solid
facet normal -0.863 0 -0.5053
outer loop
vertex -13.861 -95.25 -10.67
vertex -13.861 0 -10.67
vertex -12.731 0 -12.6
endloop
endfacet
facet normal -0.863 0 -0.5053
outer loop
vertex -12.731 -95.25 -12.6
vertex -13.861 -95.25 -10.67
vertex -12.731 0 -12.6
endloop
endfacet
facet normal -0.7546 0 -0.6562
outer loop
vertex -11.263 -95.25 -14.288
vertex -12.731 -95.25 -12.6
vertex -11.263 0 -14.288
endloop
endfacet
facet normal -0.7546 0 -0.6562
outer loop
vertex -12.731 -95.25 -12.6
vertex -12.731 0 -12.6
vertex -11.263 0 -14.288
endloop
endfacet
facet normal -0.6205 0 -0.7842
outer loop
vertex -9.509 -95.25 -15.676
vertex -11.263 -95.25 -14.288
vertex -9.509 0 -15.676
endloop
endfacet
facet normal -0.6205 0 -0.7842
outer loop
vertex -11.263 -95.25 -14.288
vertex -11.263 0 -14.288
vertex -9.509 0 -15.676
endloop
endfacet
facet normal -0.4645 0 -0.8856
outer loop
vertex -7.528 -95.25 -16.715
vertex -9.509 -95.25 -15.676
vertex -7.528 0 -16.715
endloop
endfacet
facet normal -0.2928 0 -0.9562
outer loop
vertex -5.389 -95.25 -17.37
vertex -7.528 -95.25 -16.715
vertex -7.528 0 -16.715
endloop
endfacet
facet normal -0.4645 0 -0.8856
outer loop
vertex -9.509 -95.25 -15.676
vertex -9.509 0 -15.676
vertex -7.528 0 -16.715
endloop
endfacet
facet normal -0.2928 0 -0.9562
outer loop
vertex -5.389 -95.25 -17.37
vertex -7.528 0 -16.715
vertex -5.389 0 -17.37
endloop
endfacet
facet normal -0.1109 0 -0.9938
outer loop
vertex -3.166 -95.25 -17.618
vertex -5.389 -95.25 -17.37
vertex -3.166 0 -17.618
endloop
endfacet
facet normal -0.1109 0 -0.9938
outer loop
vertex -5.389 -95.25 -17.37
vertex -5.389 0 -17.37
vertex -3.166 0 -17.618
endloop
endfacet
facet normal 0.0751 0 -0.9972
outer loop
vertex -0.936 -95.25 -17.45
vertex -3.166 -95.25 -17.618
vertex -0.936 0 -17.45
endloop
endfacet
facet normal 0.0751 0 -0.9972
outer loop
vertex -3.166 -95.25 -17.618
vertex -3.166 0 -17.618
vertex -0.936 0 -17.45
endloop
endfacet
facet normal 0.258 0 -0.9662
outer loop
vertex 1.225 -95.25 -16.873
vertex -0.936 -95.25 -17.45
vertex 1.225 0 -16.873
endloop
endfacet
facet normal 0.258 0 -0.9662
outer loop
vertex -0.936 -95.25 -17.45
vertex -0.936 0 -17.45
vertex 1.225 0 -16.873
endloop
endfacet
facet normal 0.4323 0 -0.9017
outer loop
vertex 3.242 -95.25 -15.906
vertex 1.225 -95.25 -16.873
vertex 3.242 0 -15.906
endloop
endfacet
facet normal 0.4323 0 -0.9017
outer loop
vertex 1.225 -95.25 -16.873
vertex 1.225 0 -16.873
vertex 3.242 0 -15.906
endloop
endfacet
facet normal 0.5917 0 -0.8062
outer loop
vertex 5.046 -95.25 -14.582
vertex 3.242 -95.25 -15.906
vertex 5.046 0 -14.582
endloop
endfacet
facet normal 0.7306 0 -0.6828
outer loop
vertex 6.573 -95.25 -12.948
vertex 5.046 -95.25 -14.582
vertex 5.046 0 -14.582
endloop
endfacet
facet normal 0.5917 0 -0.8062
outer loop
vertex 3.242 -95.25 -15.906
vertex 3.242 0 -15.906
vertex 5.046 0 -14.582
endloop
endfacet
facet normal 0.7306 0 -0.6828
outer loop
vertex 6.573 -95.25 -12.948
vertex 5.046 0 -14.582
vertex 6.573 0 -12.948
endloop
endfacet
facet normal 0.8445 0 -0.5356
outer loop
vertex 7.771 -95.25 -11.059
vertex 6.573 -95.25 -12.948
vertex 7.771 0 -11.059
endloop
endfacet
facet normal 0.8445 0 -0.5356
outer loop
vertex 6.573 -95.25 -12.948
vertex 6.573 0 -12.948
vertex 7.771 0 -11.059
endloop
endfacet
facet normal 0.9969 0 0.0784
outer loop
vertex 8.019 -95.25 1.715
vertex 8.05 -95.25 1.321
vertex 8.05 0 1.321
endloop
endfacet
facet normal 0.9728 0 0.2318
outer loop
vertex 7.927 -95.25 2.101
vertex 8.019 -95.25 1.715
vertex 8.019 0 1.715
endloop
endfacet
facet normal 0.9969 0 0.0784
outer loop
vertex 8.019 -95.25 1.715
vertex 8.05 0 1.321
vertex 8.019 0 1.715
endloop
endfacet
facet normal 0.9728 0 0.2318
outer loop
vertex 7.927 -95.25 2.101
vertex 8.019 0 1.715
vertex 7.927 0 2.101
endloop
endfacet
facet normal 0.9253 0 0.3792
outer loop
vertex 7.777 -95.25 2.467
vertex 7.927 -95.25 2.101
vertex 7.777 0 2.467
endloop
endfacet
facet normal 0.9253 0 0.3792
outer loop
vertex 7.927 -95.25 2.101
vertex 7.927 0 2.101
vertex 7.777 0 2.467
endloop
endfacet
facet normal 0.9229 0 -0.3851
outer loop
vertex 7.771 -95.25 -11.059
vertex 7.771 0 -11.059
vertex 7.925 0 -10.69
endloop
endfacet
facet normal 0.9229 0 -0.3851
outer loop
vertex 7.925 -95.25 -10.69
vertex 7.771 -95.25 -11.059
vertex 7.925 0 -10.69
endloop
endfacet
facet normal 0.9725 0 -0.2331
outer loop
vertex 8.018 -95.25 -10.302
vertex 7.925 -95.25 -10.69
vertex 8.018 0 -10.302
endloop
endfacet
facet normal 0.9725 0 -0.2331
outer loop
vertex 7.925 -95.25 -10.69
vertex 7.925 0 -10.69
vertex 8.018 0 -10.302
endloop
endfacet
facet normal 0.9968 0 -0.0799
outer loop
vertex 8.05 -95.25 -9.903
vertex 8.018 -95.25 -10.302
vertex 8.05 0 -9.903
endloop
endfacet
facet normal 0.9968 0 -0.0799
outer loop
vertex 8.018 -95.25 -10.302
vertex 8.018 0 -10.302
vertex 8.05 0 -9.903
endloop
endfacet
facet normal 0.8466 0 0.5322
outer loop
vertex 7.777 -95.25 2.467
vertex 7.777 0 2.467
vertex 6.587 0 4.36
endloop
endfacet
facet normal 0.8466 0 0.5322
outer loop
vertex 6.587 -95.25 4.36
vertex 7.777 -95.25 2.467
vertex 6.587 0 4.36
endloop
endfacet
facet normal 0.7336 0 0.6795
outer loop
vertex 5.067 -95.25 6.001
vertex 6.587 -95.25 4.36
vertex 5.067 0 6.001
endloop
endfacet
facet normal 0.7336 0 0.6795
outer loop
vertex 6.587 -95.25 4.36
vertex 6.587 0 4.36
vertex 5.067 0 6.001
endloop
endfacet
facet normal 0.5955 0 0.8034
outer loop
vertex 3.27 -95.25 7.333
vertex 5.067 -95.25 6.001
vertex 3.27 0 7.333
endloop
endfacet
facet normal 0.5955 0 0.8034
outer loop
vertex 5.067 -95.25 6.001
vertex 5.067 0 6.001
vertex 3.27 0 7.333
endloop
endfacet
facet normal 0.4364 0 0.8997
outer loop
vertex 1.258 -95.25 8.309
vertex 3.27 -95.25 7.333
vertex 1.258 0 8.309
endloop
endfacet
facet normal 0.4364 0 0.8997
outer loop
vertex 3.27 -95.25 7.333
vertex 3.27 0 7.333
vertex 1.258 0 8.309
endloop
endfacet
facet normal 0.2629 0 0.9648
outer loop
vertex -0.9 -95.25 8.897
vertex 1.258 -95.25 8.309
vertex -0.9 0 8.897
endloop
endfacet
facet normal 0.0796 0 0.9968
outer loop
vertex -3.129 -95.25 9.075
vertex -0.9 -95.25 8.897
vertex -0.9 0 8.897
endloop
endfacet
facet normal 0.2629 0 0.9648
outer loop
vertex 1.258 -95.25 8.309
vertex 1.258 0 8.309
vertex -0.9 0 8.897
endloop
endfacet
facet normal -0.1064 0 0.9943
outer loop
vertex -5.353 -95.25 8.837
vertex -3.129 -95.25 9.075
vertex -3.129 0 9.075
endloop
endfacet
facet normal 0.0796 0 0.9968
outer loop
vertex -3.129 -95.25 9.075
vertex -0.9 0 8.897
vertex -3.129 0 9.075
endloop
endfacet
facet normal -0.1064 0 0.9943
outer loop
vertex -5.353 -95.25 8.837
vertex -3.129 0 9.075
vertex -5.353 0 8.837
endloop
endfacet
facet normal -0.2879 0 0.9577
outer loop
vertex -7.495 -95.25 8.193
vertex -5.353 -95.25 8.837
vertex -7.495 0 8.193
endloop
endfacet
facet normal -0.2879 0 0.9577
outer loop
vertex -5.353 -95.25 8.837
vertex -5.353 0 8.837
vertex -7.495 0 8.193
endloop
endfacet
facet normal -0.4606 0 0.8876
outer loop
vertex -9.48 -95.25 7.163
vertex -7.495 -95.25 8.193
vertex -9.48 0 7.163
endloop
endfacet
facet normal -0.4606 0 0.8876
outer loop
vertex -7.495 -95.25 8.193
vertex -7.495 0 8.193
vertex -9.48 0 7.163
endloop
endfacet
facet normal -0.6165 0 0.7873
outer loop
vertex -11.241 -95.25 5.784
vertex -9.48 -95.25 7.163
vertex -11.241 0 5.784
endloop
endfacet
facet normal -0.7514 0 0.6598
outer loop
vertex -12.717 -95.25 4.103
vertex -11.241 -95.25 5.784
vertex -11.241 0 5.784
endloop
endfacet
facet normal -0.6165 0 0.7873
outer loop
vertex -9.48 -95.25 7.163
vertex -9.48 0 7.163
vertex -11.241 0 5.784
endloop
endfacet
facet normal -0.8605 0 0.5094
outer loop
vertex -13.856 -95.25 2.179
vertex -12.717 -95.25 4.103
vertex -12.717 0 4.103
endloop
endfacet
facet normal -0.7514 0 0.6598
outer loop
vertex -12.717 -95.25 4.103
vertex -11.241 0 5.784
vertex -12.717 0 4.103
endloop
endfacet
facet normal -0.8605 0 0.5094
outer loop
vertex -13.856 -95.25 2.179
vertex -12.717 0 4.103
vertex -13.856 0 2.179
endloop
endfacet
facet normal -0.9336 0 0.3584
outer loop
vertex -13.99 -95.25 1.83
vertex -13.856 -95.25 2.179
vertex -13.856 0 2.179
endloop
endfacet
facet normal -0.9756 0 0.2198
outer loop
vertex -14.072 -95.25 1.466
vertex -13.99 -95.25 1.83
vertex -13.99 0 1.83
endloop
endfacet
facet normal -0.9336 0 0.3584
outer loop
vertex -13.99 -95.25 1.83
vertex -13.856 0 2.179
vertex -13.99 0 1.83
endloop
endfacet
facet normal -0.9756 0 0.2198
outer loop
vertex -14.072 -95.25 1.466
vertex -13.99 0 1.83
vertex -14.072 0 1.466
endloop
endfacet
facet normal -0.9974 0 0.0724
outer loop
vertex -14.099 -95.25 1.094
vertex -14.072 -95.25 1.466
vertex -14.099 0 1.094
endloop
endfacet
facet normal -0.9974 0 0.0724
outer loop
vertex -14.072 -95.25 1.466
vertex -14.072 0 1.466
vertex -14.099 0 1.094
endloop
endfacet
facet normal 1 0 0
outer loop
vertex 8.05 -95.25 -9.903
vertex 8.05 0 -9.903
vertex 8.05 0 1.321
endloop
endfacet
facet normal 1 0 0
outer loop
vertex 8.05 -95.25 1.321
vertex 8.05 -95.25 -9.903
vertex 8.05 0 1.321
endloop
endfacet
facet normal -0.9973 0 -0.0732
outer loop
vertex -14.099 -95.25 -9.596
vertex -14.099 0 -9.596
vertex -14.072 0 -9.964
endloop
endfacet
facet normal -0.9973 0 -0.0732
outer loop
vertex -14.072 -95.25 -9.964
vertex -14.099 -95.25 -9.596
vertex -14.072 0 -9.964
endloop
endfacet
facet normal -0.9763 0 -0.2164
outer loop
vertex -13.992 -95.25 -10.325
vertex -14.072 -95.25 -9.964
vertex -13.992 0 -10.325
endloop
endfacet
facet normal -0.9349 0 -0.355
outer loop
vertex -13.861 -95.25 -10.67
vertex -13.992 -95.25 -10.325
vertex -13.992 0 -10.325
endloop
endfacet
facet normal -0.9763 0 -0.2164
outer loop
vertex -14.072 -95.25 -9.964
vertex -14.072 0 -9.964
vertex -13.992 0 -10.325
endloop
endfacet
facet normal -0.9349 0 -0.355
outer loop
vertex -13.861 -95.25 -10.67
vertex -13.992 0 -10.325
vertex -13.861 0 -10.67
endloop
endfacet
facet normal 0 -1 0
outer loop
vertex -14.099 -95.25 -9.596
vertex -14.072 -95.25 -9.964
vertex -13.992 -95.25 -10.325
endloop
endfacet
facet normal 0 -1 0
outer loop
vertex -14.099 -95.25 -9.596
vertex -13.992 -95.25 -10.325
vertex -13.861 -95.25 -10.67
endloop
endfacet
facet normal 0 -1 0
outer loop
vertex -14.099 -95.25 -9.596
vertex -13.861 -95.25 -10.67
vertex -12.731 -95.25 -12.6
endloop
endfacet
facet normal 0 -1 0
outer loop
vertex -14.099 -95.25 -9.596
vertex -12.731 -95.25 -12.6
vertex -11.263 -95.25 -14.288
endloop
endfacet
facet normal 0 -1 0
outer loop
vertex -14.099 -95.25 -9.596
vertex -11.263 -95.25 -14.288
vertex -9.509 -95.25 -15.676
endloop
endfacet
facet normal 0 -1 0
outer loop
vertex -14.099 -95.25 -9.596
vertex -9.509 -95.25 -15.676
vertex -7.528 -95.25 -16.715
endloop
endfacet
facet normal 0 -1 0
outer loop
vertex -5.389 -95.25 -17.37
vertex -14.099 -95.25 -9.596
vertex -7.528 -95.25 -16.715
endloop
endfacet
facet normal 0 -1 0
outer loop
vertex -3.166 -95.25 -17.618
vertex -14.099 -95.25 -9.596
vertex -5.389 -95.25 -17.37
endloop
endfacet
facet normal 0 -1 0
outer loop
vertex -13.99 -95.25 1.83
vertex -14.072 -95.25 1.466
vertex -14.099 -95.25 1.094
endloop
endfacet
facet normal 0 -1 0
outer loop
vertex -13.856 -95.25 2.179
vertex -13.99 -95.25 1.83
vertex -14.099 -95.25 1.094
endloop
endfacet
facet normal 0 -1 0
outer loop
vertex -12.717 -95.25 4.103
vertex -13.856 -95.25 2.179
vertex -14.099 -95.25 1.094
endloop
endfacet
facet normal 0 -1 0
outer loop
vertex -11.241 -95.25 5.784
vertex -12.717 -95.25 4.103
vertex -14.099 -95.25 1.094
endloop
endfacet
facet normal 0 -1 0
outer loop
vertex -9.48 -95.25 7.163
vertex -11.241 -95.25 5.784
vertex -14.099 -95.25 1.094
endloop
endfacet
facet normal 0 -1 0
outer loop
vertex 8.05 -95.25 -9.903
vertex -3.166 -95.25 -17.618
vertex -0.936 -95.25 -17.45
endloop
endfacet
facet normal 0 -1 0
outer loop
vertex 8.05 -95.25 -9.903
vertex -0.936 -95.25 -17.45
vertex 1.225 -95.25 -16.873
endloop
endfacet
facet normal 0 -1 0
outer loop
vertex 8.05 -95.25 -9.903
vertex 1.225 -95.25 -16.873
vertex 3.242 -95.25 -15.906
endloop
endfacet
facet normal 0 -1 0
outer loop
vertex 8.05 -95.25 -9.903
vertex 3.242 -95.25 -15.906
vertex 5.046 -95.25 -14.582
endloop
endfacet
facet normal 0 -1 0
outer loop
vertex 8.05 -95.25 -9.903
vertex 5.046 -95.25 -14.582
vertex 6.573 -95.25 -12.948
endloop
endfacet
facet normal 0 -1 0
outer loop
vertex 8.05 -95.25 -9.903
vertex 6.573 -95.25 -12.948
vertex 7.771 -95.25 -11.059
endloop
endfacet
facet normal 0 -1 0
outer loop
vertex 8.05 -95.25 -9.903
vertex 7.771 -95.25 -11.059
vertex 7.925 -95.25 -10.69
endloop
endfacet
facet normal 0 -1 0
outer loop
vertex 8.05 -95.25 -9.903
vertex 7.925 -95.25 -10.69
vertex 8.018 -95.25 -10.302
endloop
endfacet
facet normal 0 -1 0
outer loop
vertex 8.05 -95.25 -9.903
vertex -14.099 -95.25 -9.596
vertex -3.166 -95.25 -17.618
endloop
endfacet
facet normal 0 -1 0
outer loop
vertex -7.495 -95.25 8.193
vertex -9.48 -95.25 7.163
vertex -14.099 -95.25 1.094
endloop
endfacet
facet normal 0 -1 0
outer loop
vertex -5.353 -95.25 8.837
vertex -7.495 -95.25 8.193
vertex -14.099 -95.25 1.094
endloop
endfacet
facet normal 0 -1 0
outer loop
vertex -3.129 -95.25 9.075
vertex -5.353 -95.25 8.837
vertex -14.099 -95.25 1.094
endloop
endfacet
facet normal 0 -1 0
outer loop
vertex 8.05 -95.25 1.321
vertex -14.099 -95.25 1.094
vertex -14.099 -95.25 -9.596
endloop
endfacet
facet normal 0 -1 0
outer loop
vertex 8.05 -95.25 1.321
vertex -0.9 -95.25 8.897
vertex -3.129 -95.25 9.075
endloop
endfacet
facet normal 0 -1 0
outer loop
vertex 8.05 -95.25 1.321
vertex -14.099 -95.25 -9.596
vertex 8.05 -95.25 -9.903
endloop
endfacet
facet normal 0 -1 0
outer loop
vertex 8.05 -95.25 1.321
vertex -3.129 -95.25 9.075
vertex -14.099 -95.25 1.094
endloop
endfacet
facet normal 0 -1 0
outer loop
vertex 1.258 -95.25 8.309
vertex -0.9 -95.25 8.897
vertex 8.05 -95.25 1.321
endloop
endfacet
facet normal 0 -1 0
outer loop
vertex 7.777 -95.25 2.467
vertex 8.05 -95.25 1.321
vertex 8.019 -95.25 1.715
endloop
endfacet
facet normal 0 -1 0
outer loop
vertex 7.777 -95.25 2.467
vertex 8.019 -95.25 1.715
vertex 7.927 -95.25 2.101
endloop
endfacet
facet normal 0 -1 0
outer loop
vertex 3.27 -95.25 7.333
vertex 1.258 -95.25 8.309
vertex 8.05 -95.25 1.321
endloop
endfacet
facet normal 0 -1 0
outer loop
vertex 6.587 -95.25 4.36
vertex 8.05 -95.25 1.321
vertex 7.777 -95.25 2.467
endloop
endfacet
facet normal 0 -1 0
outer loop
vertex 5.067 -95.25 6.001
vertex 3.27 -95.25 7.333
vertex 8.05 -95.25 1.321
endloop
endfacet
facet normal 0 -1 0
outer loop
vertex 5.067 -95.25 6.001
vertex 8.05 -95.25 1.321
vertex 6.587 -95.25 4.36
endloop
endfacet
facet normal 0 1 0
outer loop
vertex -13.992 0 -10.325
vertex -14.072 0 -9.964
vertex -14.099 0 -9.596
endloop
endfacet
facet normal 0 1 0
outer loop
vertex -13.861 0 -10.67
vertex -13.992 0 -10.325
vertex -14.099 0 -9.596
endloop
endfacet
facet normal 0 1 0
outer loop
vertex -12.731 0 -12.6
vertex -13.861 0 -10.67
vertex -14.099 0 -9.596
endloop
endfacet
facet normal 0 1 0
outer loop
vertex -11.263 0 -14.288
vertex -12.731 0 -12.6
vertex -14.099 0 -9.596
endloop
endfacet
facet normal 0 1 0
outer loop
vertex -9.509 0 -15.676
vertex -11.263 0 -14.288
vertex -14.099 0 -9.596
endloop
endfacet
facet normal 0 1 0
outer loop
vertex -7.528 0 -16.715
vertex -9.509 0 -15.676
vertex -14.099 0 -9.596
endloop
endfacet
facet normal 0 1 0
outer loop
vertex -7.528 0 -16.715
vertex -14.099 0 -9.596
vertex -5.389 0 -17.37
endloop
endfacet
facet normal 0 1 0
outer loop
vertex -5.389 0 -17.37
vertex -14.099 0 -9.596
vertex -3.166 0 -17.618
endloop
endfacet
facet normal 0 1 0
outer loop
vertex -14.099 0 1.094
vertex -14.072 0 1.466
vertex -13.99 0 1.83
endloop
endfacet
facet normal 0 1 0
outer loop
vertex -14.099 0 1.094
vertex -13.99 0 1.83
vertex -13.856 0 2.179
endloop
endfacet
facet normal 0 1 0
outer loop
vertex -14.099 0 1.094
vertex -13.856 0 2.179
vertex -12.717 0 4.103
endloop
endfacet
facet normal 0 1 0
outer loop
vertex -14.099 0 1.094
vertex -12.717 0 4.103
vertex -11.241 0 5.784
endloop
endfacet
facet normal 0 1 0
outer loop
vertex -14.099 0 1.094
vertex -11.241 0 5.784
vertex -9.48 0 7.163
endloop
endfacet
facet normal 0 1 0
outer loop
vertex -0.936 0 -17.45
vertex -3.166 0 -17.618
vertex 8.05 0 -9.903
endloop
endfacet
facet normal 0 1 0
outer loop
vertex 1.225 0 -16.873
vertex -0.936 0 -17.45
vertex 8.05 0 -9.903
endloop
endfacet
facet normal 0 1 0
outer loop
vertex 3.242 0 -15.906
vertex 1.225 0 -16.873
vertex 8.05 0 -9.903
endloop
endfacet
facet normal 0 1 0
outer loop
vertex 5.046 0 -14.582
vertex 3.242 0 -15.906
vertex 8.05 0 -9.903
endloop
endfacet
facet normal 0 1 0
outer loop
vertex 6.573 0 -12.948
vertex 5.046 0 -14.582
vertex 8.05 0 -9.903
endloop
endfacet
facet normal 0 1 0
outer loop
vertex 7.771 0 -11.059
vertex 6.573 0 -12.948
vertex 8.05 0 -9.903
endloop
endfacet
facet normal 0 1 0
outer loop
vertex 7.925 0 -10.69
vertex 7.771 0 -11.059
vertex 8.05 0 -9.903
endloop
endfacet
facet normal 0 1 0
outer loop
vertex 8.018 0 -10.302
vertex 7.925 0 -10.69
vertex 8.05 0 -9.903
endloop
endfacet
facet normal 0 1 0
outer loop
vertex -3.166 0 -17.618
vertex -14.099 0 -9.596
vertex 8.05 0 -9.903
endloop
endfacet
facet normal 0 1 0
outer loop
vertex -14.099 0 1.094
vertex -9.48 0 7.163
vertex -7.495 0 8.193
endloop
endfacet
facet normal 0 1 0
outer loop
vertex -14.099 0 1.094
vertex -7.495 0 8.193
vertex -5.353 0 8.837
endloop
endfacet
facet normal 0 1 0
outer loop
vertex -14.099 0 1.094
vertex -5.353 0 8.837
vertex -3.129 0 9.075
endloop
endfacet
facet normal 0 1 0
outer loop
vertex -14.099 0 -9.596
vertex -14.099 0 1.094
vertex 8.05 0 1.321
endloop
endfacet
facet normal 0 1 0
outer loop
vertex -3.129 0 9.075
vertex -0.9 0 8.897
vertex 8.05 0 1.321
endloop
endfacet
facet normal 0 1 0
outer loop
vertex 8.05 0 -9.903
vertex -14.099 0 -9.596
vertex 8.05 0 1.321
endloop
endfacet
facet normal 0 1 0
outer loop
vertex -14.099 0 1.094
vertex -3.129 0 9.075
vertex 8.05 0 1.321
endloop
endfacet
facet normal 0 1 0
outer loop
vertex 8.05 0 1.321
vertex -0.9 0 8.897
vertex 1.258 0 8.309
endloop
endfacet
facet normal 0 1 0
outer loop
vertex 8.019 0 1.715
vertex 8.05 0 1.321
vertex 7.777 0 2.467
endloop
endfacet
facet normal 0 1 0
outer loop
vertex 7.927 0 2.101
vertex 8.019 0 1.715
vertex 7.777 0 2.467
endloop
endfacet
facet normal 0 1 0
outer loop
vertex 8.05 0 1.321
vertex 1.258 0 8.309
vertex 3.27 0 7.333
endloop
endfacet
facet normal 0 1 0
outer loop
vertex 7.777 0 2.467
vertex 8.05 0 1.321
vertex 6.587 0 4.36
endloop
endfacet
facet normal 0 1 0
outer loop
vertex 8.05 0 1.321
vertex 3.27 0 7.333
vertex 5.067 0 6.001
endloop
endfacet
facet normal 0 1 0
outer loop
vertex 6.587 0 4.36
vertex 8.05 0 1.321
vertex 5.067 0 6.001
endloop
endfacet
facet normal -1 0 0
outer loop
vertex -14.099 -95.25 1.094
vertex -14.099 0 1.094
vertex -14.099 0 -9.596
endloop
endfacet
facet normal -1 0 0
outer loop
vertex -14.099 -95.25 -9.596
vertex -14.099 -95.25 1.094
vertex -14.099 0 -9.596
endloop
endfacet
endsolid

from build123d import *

# Parameters (mm, degrees)
F1_DEPTH = 95.25


with BuildPart() as f1:
    # F0 (on Front) → F1 (new body)
    with BuildSketch(Plane.XZ):
        with BuildLine():
            ThreePointArc((-13.855658, 2.178556), (-14.037455, 1.649547), (-14.09905, 1.093573))
            Line((-14.09905, 1.093573), (-14.09905, -9.595976))
            ThreePointArc((-14.09905, -9.595976), (-14.03879, -10.145966), (-13.86087, -10.669859))
            ThreePointArc((-13.86087, -10.669859), (-3.166244, -17.617713), (7.771441, -11.059152))
            ThreePointArc((7.771441, -11.059152), (7.979193, -10.497663), (8.04975, -9.903145))
            Line((8.04975, -9.903145), (8.04975, 1.320869))
            ThreePointArc((8.04975, 1.320869), (7.980533, 1.909795), (7.776653, 2.466623))
            ThreePointArc((7.776653, 2.466623), (-3.129417, 9.074671), (-13.855658, 2.178556))
        make_face()
    extrude(amount=F1_DEPTH)


solid = f1.part
